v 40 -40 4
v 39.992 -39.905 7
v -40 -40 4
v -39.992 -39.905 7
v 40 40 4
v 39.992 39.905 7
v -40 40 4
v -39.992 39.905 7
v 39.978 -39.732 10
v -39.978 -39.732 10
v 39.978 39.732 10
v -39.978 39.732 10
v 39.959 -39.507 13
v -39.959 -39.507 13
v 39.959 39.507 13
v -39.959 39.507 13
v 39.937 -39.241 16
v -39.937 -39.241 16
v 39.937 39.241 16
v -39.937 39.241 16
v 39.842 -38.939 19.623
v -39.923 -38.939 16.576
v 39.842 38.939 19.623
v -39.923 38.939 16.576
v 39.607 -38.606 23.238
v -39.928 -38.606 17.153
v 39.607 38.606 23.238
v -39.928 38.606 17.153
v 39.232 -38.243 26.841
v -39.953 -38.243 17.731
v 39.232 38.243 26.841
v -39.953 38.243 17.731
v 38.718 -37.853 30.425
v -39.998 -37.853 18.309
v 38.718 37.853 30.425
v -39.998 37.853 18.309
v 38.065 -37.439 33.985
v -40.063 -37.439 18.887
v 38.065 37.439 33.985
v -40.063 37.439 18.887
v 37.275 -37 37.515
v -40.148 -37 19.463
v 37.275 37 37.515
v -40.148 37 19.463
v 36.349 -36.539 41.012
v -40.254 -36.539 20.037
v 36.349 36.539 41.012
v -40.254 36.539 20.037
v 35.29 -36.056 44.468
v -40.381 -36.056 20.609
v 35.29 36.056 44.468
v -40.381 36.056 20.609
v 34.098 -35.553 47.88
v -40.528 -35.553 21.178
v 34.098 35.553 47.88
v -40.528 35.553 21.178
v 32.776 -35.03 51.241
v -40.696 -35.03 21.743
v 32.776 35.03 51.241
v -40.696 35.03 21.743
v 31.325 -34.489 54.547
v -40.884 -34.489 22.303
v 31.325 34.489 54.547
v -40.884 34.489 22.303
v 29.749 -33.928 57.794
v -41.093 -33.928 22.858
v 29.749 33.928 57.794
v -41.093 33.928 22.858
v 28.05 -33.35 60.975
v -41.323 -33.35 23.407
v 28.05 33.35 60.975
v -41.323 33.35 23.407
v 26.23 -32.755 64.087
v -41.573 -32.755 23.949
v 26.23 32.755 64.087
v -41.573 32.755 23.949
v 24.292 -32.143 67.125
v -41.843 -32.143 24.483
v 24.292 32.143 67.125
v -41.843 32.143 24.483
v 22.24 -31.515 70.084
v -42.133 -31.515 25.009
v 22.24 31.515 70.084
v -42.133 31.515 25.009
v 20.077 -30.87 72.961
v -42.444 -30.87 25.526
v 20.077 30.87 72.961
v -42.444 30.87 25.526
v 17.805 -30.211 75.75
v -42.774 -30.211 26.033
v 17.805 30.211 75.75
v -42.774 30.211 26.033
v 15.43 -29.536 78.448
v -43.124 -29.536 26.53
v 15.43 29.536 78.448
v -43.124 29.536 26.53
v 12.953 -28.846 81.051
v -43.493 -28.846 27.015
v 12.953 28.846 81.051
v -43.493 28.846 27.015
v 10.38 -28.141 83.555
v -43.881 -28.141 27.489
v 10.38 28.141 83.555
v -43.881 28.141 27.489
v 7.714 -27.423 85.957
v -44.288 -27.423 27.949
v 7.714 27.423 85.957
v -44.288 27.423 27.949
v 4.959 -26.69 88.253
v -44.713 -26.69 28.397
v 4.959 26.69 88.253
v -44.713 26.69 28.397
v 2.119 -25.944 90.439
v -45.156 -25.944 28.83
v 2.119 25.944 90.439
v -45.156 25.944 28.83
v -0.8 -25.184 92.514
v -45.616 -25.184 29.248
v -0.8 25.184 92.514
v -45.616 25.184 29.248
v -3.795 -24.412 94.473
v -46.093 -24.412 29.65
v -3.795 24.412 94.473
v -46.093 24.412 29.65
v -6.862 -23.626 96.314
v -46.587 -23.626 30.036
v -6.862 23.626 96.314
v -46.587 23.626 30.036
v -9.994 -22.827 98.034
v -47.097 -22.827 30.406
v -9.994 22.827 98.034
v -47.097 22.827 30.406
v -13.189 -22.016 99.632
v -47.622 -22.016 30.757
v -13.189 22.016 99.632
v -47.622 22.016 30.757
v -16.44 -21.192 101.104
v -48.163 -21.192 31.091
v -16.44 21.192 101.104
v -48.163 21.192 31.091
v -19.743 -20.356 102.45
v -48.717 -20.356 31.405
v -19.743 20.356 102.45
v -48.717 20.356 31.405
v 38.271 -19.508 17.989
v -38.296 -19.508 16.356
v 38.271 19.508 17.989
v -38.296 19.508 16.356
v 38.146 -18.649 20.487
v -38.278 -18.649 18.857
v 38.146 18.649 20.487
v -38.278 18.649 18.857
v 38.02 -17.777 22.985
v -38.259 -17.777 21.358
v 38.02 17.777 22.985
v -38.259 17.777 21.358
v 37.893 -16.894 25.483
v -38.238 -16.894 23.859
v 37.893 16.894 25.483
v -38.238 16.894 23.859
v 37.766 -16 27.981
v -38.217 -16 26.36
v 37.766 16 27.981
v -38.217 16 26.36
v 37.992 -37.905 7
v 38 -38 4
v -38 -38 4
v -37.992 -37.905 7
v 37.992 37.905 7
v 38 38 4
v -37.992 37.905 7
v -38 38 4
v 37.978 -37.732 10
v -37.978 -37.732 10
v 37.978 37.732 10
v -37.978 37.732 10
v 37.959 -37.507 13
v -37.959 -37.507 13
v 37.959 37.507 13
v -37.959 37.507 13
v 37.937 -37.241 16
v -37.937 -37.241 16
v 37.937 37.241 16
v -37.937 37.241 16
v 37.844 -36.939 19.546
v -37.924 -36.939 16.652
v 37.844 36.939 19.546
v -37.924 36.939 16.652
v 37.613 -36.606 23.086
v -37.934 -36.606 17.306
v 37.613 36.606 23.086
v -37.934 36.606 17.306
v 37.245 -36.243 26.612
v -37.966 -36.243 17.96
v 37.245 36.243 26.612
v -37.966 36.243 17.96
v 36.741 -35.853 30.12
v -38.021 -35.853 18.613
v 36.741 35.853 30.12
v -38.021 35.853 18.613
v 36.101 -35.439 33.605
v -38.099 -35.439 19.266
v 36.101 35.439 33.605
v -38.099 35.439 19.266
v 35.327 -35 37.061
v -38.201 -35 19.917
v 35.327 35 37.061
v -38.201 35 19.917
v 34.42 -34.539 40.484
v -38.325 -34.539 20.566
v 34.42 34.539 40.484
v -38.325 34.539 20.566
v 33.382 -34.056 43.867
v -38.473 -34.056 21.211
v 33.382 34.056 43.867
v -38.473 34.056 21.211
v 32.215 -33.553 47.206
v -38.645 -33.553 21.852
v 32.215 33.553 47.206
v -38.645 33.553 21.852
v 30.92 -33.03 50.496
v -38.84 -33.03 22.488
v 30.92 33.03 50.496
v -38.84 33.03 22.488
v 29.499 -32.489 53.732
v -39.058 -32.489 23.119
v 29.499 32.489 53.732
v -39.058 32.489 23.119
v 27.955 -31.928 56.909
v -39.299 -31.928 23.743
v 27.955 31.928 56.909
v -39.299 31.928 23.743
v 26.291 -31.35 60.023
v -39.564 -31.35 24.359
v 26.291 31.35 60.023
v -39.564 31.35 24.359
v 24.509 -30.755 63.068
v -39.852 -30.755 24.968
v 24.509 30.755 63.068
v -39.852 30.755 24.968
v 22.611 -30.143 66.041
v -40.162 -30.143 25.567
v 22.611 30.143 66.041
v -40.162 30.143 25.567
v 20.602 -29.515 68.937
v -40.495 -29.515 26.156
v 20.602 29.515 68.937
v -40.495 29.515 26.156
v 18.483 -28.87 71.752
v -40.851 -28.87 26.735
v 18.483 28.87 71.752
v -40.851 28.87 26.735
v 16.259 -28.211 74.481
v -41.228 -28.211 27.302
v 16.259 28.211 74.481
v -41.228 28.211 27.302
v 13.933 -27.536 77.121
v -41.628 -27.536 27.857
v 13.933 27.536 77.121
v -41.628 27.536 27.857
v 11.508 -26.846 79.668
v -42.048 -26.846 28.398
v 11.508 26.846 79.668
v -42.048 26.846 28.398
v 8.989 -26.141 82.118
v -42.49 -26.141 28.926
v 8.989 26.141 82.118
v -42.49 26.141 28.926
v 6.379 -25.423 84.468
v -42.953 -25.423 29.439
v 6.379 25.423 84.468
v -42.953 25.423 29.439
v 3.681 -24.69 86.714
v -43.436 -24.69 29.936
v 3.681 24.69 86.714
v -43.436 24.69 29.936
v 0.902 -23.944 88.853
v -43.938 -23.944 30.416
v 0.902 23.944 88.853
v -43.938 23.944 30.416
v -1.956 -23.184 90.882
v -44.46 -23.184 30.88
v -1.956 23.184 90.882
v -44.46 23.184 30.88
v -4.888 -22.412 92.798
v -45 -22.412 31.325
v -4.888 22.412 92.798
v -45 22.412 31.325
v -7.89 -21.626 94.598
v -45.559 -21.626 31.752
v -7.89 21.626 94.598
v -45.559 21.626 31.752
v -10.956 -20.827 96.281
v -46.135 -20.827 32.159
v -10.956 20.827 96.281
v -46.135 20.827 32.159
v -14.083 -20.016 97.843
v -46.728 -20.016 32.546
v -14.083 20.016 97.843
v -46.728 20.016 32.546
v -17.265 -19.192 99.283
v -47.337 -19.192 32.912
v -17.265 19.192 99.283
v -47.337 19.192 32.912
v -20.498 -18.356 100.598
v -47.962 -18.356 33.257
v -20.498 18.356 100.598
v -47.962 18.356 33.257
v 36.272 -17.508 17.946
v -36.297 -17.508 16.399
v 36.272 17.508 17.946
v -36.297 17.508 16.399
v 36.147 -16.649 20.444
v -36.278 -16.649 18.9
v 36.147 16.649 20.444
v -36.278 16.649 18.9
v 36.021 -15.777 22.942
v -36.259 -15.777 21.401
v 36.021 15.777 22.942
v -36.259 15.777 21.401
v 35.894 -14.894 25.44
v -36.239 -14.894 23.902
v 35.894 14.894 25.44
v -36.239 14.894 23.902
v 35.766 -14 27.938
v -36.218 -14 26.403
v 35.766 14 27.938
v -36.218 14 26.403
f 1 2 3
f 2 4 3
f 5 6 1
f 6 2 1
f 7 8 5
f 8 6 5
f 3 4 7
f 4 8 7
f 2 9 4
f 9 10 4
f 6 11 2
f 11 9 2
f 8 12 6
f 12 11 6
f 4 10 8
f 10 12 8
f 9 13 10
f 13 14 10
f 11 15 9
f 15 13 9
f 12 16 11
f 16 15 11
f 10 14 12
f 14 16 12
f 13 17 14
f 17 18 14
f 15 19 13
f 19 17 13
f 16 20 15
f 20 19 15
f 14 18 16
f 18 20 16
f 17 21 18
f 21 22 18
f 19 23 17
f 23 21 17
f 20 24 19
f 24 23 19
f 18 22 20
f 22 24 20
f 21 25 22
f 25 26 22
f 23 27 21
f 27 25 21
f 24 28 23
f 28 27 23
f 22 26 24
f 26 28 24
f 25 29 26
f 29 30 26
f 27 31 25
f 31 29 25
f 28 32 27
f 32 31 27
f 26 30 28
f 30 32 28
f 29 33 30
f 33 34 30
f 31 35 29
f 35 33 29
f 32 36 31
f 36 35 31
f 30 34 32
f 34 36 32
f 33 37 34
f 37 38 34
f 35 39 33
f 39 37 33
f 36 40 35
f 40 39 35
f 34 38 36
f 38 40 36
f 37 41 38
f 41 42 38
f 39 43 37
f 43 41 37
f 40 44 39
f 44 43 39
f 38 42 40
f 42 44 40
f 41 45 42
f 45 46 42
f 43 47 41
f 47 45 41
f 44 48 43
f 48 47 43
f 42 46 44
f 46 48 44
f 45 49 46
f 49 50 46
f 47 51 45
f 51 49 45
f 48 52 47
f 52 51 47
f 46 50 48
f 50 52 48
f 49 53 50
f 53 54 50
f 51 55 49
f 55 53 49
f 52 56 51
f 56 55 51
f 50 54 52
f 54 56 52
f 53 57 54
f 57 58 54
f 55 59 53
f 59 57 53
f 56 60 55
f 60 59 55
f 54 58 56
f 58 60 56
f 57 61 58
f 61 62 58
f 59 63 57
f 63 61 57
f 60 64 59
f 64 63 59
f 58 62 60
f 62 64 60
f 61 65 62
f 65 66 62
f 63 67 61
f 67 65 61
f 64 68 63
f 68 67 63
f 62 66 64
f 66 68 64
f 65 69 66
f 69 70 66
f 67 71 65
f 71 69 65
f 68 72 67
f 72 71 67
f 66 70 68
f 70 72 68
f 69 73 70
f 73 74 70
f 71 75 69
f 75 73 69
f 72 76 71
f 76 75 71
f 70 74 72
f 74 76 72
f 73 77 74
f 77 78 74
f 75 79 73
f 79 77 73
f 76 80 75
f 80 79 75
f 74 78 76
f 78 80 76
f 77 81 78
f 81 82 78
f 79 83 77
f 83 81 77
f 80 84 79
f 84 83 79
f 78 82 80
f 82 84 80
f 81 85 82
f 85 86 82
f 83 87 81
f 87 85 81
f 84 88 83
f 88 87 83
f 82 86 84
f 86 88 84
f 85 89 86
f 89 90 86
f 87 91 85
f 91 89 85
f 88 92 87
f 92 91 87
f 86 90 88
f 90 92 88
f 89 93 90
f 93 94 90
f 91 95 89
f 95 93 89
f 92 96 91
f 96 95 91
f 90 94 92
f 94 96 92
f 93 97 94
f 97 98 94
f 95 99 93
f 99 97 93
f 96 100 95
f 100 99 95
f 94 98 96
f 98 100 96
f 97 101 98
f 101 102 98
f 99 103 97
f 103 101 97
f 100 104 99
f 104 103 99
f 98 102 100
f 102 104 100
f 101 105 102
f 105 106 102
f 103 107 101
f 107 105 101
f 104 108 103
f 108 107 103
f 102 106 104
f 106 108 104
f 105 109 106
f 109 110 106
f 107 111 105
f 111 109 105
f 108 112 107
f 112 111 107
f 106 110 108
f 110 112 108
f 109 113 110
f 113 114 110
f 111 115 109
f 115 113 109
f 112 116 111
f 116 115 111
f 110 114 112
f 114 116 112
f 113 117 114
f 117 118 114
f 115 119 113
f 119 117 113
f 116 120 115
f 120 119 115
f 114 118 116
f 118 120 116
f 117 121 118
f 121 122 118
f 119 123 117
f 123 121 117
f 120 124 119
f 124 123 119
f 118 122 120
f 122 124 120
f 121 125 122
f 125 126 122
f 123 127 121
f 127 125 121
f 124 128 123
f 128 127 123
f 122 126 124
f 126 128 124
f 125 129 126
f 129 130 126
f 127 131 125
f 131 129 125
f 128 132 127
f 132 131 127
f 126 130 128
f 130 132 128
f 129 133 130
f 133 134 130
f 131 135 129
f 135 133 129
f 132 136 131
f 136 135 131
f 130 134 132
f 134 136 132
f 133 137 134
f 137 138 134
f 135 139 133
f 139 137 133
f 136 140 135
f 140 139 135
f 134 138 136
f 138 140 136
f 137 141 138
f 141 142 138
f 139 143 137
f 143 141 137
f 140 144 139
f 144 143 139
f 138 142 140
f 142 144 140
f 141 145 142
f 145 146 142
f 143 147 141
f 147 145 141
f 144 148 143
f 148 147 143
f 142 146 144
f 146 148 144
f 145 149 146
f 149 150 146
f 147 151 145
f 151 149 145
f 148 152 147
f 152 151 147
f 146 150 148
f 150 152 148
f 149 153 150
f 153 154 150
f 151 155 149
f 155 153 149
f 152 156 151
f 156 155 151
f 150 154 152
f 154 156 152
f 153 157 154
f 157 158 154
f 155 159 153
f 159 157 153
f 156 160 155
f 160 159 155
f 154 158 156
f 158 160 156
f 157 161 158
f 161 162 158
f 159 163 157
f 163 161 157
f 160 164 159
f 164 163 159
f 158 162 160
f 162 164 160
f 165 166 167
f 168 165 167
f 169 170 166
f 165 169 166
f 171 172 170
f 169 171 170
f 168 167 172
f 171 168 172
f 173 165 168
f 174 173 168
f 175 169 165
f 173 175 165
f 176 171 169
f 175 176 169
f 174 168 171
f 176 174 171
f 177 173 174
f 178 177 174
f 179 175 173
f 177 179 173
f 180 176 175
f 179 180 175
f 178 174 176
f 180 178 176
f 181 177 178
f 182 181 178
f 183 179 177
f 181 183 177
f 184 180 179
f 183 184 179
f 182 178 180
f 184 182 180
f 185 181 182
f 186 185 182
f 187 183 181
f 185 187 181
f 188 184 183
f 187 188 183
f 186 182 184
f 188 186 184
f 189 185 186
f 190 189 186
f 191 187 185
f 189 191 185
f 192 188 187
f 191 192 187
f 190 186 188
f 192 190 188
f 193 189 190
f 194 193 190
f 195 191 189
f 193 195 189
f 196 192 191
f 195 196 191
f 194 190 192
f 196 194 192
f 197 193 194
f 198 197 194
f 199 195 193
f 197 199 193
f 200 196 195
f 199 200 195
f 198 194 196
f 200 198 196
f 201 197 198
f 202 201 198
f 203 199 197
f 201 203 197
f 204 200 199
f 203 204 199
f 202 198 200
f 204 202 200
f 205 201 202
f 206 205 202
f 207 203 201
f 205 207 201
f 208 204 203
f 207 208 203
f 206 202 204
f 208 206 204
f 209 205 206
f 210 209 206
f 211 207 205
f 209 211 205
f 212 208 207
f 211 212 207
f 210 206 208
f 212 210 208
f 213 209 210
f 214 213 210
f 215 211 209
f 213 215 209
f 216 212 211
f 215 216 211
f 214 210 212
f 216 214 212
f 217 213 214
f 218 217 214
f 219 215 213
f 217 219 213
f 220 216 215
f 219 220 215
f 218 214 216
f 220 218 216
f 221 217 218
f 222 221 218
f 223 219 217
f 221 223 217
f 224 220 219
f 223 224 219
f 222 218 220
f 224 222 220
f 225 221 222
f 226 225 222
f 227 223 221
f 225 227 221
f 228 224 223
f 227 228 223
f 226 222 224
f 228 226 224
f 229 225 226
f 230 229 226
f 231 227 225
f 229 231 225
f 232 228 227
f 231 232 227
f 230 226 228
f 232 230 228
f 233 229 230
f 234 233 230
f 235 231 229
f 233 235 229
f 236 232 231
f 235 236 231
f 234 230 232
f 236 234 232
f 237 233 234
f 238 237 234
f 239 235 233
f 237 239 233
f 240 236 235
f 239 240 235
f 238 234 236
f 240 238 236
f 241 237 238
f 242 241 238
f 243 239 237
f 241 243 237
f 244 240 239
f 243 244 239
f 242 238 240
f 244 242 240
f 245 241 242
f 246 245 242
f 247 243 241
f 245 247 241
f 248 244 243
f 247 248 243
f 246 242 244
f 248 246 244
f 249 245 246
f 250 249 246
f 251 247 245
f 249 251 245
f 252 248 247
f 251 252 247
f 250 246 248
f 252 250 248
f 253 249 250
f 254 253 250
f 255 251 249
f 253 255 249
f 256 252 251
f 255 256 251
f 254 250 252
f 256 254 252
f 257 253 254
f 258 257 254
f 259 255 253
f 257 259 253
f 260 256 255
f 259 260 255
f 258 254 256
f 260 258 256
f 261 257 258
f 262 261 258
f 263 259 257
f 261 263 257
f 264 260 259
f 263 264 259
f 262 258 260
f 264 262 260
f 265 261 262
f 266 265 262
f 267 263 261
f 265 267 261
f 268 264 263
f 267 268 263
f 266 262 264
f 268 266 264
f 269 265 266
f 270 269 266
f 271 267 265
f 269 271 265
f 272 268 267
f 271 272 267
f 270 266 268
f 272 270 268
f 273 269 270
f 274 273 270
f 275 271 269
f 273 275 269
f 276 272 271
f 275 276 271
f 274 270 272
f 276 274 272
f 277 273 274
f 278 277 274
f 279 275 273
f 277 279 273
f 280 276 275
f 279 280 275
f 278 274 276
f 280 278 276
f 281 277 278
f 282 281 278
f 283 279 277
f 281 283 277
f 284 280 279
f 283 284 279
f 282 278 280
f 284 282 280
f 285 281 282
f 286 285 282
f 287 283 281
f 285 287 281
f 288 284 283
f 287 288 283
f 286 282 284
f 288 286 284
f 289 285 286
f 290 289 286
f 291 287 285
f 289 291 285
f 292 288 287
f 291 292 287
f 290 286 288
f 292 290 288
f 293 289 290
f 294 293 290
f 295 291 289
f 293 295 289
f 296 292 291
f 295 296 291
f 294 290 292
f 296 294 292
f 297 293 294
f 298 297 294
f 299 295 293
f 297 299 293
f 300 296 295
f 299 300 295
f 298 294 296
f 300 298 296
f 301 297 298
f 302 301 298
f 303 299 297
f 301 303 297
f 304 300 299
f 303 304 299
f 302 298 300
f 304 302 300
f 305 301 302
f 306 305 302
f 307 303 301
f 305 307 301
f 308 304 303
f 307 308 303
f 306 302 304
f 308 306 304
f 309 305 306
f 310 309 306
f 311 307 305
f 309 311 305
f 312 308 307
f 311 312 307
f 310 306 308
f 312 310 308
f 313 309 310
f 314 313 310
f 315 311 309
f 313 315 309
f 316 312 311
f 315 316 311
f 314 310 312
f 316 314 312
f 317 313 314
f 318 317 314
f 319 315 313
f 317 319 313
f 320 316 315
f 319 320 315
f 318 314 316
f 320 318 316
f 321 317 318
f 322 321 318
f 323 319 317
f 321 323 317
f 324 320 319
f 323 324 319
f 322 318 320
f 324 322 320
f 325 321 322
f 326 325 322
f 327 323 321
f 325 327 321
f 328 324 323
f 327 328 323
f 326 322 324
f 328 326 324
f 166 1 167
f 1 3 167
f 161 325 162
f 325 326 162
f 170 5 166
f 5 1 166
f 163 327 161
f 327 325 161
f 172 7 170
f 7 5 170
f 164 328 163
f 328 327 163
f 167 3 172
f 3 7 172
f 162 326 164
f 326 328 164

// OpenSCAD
// 80 mm case fan -> 72 x 28 mm right-angle duct adapter
//
// Axis convention (matches request)
//   - Fan mounts to the flange in the XY plane at z = 0, air enters along +Z.
//   - The 90 degree turn is in the XZ plane, so the bend axis is Y.
//   - The 28 mm outlet side is parallel to that bend axis (Y).
//   - The 72 mm outlet side is the in-plane/radial dimension (Z at the outlet).
//   - Air exits along -X.
//
// The duct itself is one watertight polyhedron: outer skin + inner skin +
// annular caps. No boolean is needed to hollow it. The fan flange and outlet
// rim are simple CSG boxes added afterwards.

$fn = 64;

// ---------------- parameters ----------------
fan_hole_pitch = 71.5;   // standard 80 mm fan hole spacing
fan_hole_d     = 4.5;    // M4 clearance
fan_pad_r      = 6.5;    // corner pads so the M4 holes have material around them
fan_tie_w      = 6.0;    // zip-tie slot width
fan_tie_l      = 4.0;    // zip-tie slot length (1 mm web each side of flange)
fan_tie_pos    = 41.0;   // slot center distance from flange center
fan_tie_pair   = 9.0;    // ± offset of the two slots on each flange side

inlet_clear   = 76;      // clear square throat at fan
wall          = 2.0;     // duct wall thickness (5 perimeters at 0.4 mm nozzle)

flange_t      = 5;       // fan flange thickness
flange_outer  = 88;      // fan flange outer size

// M3 pilot holes for self-tapping screws in the fan corner pads (alternative
// to zip ties). Set to 0 to remove them.
fan_pilot_d       = 2.6;
fan_pilot_offset  = 4.8; // distance from M4 hole center, toward the flange edge

out_radial    = 72;      // outlet clear dim in bend plane (Z at outlet)
out_axis      = 28;      // outlet clear dim along bend axis (Y)
out_lip       = 10;      // straight run after arc

center_r      = 55;      // centerline bend radius
lead_in       = 12;      // vertical lead before arc
bend_angle    = 70;      // 90 - trim; stop 20 deg early -> min slope ~20 deg

rim_t         = 3;       // outlet rim thickness
rim_extra     = 9;       // rim overhang per side (gives 1.5 mm web around 6 mm slots)
rim_tie_pair_z = 14;     // ± Z offset of tie slots on the Y-side tabs
rim_tie_pair_y = 8;      // ± Y offset of tie slots on the Z-side tabs

n_straight    = 4;
n_bend        = 32;
n_out         = 4;
taper_exp     = 1.5;     // >1 keeps section large deeper into the bend

// ---------------- derived ----------------
in_half    = inlet_clear/2;
out_r_half = out_radial/2;
out_a_half = out_axis/2;

z_start   = flange_t - 1 + lead_in;   // arc start (duct overlaps flange)
th_end    = bend_angle * 3.14159265/180;
arc_end_x = -center_r + center_r*cos(th_end);
arc_end_z = z_start + center_r*sin(th_end);
outlet_x  = arc_end_x - out_lip*sin(th_end);
outlet_z  = arc_end_z + out_lip*cos(th_end);
rim_rot   = 90 - bend_angle;          // rim frame rotation about Y

// ---------------- path ----------------
// Section = [cx, cz, nx, nz, half_radial, half_axis]
// (nx,nz) = in-plane radial unit vector; tangent = (-nz, nx).
function path_sections(n) = [
    for (i=[0:n])
    let (
        ns=n_straight, nb=n_bend, no=n_out,
        seg = i < ns ? 0 : (i < ns+nb ? 1 : 2),
        u   = seg==0 ? i/ns : (seg==1 ? (i-ns)/nb : (i-ns-nb)/no),
        th  = seg==0 ? 0 : (seg==1 ? u*bend_angle : bend_angle),
        cx  = seg==0 ? 0
            : seg==1 ? -center_r + center_r*cos(th)
            : arc_end_x - out_lip*sin(th_end)*u,
        cz  = seg==0 ? z_start - lead_in*(1-u)
            : seg==1 ? z_start + center_r*sin(th)
            : arc_end_z + out_lip*cos(th_end)*u,
        nx  = seg==0 ? 1 : (seg==1 ? cos(th) : cos(th_end)),
        nz  = seg==0 ? 0 : (seg==1 ? sin(th) : sin(th_end)),
        g   = pow(u_global(i,ns,nb,no,n), taper_exp),
        hr  = in_half + (out_r_half - in_half)*g,
        ha  = in_half + (out_a_half - in_half)*g
    )
    [cx, cz, nx, nz, hr, ha]
];

function u_global(i,ns,nb,no,n) = i/n;

function corner(s,a,b,off) =
    [ s[0] + s[2]*a*(s[4]+off),
      b*(s[5]+off),
      s[1] + s[3]*a*(s[4]+off) ];

function ring_verts(sec,off) = [
    for (s=sec) each [
        corner(s,-1,-1,off), corner(s, 1,-1,off),
        corner(s, 1, 1,off), corner(s,-1, 1,off)
    ]
];

// Explicit triangles: non-planar quads on a curved path are triangulated here
// instead of relying on polyhedron's internal triangulation.
// Winding: these helpers emit outward-facing triangles (positive signed
// volume). The previous winding produced an inside-out duct, which made CGAL's
// union with the tilted rim fail with an assertion.
function tri_quad(a,b,c,d) = [[a,c,b],[a,d,c]];
function tri_quad_rev(a,b,c,d) = [[a,b,c],[a,c,d]];

function outer_faces(nr) = [
    for (i=[0:nr-2], j=[0:3])
    let (a=4*i+j, b=4*i+(j+1)%4,
         c=4*(i+1)+(j+1)%4, d=4*(i+1)+j)
    each tri_quad(a,b,c,d)
];

function inner_faces(nr) = [
    for (i=[0:nr-2], j=[0:3])
    let (o=4*nr, a=o+4*i+j, b=o+4*i+(j+1)%4,
         c=o+4*(i+1)+(j+1)%4, d=o+4*(i+1)+j)
    each tri_quad_rev(a,b,c,d)
];

function cap_faces(nr) = [
    for (j=[0:3])
    let (j2=(j+1)%4, o=4*nr,
         last=4*(nr-1), olast=o+last)
    each concat(
        tri_quad(o+j, o+j2, j2, j),              // inlet annulus, normal -t
        tri_quad(last+j, last+j2, olast+j2, olast+j)  // outlet annulus, +t
    )
];

module hollow_duct(sec) {
    nr = len(sec);
    polyhedron(
        concat(ring_verts(sec, wall), ring_verts(sec, 0)),
        concat(outer_faces(nr), inner_faces(nr), cap_faces(nr)),
        convex=false
    );
}

// ---------------- flange and rim ----------------
module fan_flange_base() {
    // Flange plate with the square throat cut out. Pads are added afterwards
    // so the mounting holes at the corners have material around them.
    difference() {
        translate([0,0,flange_t/2])
            cube([flange_outer, flange_outer, flange_t], center=true);
        translate([0,0,-1])
            cube([inlet_clear, inlet_clear, flange_t+2], center=true);
    }
}

module fan_pads() {
    for (sx=[-1,1], sy=[-1,1])
        translate([sx*fan_hole_pitch/2, sy*fan_hole_pitch/2, flange_t/2])
            cylinder(r=fan_pad_r, h=flange_t, center=true);
}

module fan_tie_slots() {
    // Two slots on each edge of the flange, through its thickness.
    // Y-facing edges: slot long axis radial (Y).
    for (sy=[-1,1], dx=[-1,1])
        translate([dx*fan_tie_pair, sy*fan_tie_pos, flange_t/2])
            cube([fan_tie_w, fan_tie_l, flange_t+2], center=true);
    // X-facing edges: slot long axis radial (X).
    for (sx=[-1,1], dy=[-1,1])
        translate([sx*fan_tie_pos, dy*fan_tie_pair, flange_t/2])
            cube([fan_tie_l, fan_tie_w, flange_t+2], center=true);
}

module fan_holes() {
    p = fan_hole_pitch/2;
    for (sx=[-1,1], sy=[-1,1]) {
        // Standard M4 clearance hole.
        translate([sx*p, sy*p, -1])
            cylinder(d=fan_hole_d, h=flange_t+2);
        // Optional M3 self-tapping pilot, angled out toward the flange corner.
        if (fan_pilot_d > 0)
            translate([sx*(p + fan_pilot_offset/sqrt(2)),
                       sy*(p + fan_pilot_offset/sqrt(2)), -1])
                cylinder(d=fan_pilot_d, h=flange_t+2);
    }
}

module fan_flange() {
    difference() {
        union() {
            fan_flange_base();
            fan_pads();
        }
        fan_holes();
        fan_tie_slots();
    }
}

module rim_tie_slots_local(ow, oh) {
    // Local frame: X = upstream normal, Y = bend axis, Z = radial at outlet.
    ytab = out_axis/2 + wall + rim_extra/2;
    ztab = out_radial/2 + wall + rim_extra/2;
    xc = -rim_t + 0.5;
    xlen = rim_t + 3;
    // Y-side tabs (parallel to the bend axis): slots long in local Z.
    for (sy=[-1,1], dz=[-1,1])
        translate([xc, sy*ytab, dz*rim_tie_pair_z])
            cube([xlen, fan_tie_w, fan_tie_l], center=true);
    // Z-side tabs (bend-plane sides): slots long in local Y.
    for (sz=[-1,1], dy=[-1,1])
        translate([xc, dy*rim_tie_pair_y, sz*ztab])
            cube([xlen, fan_tie_l, fan_tie_w], center=true);
}

module rim_local() {
    ow = out_axis + 2*wall + 2*rim_extra;   // Y
    oh = out_radial + 2*wall + 2*rim_extra; // local Z
    difference() {
        // local X from -rim_t to +1 (1 mm overlap with duct)
        translate([-rim_t, -ow/2, -oh/2])
            cube([rim_t+1, ow, oh], center=false);
        translate([-rim_t-1, -out_axis/2, -out_radial/2])
            cube([rim_t+3, out_axis, out_radial], center=false);
        rim_tie_slots_local(ow, oh);
    }
}

module outlet_rim() {
    translate([outlet_x, 0, outlet_z])
        rotate([0, rim_rot, 0])
            rim_local();
}

module adapter() {
    union() {
        hollow_duct(path_sections(n_straight+n_bend+n_out));
        fan_flange();
        outlet_rim();
    }
}


hollow_duct(path_sections(n_straight+n_bend+n_out));
